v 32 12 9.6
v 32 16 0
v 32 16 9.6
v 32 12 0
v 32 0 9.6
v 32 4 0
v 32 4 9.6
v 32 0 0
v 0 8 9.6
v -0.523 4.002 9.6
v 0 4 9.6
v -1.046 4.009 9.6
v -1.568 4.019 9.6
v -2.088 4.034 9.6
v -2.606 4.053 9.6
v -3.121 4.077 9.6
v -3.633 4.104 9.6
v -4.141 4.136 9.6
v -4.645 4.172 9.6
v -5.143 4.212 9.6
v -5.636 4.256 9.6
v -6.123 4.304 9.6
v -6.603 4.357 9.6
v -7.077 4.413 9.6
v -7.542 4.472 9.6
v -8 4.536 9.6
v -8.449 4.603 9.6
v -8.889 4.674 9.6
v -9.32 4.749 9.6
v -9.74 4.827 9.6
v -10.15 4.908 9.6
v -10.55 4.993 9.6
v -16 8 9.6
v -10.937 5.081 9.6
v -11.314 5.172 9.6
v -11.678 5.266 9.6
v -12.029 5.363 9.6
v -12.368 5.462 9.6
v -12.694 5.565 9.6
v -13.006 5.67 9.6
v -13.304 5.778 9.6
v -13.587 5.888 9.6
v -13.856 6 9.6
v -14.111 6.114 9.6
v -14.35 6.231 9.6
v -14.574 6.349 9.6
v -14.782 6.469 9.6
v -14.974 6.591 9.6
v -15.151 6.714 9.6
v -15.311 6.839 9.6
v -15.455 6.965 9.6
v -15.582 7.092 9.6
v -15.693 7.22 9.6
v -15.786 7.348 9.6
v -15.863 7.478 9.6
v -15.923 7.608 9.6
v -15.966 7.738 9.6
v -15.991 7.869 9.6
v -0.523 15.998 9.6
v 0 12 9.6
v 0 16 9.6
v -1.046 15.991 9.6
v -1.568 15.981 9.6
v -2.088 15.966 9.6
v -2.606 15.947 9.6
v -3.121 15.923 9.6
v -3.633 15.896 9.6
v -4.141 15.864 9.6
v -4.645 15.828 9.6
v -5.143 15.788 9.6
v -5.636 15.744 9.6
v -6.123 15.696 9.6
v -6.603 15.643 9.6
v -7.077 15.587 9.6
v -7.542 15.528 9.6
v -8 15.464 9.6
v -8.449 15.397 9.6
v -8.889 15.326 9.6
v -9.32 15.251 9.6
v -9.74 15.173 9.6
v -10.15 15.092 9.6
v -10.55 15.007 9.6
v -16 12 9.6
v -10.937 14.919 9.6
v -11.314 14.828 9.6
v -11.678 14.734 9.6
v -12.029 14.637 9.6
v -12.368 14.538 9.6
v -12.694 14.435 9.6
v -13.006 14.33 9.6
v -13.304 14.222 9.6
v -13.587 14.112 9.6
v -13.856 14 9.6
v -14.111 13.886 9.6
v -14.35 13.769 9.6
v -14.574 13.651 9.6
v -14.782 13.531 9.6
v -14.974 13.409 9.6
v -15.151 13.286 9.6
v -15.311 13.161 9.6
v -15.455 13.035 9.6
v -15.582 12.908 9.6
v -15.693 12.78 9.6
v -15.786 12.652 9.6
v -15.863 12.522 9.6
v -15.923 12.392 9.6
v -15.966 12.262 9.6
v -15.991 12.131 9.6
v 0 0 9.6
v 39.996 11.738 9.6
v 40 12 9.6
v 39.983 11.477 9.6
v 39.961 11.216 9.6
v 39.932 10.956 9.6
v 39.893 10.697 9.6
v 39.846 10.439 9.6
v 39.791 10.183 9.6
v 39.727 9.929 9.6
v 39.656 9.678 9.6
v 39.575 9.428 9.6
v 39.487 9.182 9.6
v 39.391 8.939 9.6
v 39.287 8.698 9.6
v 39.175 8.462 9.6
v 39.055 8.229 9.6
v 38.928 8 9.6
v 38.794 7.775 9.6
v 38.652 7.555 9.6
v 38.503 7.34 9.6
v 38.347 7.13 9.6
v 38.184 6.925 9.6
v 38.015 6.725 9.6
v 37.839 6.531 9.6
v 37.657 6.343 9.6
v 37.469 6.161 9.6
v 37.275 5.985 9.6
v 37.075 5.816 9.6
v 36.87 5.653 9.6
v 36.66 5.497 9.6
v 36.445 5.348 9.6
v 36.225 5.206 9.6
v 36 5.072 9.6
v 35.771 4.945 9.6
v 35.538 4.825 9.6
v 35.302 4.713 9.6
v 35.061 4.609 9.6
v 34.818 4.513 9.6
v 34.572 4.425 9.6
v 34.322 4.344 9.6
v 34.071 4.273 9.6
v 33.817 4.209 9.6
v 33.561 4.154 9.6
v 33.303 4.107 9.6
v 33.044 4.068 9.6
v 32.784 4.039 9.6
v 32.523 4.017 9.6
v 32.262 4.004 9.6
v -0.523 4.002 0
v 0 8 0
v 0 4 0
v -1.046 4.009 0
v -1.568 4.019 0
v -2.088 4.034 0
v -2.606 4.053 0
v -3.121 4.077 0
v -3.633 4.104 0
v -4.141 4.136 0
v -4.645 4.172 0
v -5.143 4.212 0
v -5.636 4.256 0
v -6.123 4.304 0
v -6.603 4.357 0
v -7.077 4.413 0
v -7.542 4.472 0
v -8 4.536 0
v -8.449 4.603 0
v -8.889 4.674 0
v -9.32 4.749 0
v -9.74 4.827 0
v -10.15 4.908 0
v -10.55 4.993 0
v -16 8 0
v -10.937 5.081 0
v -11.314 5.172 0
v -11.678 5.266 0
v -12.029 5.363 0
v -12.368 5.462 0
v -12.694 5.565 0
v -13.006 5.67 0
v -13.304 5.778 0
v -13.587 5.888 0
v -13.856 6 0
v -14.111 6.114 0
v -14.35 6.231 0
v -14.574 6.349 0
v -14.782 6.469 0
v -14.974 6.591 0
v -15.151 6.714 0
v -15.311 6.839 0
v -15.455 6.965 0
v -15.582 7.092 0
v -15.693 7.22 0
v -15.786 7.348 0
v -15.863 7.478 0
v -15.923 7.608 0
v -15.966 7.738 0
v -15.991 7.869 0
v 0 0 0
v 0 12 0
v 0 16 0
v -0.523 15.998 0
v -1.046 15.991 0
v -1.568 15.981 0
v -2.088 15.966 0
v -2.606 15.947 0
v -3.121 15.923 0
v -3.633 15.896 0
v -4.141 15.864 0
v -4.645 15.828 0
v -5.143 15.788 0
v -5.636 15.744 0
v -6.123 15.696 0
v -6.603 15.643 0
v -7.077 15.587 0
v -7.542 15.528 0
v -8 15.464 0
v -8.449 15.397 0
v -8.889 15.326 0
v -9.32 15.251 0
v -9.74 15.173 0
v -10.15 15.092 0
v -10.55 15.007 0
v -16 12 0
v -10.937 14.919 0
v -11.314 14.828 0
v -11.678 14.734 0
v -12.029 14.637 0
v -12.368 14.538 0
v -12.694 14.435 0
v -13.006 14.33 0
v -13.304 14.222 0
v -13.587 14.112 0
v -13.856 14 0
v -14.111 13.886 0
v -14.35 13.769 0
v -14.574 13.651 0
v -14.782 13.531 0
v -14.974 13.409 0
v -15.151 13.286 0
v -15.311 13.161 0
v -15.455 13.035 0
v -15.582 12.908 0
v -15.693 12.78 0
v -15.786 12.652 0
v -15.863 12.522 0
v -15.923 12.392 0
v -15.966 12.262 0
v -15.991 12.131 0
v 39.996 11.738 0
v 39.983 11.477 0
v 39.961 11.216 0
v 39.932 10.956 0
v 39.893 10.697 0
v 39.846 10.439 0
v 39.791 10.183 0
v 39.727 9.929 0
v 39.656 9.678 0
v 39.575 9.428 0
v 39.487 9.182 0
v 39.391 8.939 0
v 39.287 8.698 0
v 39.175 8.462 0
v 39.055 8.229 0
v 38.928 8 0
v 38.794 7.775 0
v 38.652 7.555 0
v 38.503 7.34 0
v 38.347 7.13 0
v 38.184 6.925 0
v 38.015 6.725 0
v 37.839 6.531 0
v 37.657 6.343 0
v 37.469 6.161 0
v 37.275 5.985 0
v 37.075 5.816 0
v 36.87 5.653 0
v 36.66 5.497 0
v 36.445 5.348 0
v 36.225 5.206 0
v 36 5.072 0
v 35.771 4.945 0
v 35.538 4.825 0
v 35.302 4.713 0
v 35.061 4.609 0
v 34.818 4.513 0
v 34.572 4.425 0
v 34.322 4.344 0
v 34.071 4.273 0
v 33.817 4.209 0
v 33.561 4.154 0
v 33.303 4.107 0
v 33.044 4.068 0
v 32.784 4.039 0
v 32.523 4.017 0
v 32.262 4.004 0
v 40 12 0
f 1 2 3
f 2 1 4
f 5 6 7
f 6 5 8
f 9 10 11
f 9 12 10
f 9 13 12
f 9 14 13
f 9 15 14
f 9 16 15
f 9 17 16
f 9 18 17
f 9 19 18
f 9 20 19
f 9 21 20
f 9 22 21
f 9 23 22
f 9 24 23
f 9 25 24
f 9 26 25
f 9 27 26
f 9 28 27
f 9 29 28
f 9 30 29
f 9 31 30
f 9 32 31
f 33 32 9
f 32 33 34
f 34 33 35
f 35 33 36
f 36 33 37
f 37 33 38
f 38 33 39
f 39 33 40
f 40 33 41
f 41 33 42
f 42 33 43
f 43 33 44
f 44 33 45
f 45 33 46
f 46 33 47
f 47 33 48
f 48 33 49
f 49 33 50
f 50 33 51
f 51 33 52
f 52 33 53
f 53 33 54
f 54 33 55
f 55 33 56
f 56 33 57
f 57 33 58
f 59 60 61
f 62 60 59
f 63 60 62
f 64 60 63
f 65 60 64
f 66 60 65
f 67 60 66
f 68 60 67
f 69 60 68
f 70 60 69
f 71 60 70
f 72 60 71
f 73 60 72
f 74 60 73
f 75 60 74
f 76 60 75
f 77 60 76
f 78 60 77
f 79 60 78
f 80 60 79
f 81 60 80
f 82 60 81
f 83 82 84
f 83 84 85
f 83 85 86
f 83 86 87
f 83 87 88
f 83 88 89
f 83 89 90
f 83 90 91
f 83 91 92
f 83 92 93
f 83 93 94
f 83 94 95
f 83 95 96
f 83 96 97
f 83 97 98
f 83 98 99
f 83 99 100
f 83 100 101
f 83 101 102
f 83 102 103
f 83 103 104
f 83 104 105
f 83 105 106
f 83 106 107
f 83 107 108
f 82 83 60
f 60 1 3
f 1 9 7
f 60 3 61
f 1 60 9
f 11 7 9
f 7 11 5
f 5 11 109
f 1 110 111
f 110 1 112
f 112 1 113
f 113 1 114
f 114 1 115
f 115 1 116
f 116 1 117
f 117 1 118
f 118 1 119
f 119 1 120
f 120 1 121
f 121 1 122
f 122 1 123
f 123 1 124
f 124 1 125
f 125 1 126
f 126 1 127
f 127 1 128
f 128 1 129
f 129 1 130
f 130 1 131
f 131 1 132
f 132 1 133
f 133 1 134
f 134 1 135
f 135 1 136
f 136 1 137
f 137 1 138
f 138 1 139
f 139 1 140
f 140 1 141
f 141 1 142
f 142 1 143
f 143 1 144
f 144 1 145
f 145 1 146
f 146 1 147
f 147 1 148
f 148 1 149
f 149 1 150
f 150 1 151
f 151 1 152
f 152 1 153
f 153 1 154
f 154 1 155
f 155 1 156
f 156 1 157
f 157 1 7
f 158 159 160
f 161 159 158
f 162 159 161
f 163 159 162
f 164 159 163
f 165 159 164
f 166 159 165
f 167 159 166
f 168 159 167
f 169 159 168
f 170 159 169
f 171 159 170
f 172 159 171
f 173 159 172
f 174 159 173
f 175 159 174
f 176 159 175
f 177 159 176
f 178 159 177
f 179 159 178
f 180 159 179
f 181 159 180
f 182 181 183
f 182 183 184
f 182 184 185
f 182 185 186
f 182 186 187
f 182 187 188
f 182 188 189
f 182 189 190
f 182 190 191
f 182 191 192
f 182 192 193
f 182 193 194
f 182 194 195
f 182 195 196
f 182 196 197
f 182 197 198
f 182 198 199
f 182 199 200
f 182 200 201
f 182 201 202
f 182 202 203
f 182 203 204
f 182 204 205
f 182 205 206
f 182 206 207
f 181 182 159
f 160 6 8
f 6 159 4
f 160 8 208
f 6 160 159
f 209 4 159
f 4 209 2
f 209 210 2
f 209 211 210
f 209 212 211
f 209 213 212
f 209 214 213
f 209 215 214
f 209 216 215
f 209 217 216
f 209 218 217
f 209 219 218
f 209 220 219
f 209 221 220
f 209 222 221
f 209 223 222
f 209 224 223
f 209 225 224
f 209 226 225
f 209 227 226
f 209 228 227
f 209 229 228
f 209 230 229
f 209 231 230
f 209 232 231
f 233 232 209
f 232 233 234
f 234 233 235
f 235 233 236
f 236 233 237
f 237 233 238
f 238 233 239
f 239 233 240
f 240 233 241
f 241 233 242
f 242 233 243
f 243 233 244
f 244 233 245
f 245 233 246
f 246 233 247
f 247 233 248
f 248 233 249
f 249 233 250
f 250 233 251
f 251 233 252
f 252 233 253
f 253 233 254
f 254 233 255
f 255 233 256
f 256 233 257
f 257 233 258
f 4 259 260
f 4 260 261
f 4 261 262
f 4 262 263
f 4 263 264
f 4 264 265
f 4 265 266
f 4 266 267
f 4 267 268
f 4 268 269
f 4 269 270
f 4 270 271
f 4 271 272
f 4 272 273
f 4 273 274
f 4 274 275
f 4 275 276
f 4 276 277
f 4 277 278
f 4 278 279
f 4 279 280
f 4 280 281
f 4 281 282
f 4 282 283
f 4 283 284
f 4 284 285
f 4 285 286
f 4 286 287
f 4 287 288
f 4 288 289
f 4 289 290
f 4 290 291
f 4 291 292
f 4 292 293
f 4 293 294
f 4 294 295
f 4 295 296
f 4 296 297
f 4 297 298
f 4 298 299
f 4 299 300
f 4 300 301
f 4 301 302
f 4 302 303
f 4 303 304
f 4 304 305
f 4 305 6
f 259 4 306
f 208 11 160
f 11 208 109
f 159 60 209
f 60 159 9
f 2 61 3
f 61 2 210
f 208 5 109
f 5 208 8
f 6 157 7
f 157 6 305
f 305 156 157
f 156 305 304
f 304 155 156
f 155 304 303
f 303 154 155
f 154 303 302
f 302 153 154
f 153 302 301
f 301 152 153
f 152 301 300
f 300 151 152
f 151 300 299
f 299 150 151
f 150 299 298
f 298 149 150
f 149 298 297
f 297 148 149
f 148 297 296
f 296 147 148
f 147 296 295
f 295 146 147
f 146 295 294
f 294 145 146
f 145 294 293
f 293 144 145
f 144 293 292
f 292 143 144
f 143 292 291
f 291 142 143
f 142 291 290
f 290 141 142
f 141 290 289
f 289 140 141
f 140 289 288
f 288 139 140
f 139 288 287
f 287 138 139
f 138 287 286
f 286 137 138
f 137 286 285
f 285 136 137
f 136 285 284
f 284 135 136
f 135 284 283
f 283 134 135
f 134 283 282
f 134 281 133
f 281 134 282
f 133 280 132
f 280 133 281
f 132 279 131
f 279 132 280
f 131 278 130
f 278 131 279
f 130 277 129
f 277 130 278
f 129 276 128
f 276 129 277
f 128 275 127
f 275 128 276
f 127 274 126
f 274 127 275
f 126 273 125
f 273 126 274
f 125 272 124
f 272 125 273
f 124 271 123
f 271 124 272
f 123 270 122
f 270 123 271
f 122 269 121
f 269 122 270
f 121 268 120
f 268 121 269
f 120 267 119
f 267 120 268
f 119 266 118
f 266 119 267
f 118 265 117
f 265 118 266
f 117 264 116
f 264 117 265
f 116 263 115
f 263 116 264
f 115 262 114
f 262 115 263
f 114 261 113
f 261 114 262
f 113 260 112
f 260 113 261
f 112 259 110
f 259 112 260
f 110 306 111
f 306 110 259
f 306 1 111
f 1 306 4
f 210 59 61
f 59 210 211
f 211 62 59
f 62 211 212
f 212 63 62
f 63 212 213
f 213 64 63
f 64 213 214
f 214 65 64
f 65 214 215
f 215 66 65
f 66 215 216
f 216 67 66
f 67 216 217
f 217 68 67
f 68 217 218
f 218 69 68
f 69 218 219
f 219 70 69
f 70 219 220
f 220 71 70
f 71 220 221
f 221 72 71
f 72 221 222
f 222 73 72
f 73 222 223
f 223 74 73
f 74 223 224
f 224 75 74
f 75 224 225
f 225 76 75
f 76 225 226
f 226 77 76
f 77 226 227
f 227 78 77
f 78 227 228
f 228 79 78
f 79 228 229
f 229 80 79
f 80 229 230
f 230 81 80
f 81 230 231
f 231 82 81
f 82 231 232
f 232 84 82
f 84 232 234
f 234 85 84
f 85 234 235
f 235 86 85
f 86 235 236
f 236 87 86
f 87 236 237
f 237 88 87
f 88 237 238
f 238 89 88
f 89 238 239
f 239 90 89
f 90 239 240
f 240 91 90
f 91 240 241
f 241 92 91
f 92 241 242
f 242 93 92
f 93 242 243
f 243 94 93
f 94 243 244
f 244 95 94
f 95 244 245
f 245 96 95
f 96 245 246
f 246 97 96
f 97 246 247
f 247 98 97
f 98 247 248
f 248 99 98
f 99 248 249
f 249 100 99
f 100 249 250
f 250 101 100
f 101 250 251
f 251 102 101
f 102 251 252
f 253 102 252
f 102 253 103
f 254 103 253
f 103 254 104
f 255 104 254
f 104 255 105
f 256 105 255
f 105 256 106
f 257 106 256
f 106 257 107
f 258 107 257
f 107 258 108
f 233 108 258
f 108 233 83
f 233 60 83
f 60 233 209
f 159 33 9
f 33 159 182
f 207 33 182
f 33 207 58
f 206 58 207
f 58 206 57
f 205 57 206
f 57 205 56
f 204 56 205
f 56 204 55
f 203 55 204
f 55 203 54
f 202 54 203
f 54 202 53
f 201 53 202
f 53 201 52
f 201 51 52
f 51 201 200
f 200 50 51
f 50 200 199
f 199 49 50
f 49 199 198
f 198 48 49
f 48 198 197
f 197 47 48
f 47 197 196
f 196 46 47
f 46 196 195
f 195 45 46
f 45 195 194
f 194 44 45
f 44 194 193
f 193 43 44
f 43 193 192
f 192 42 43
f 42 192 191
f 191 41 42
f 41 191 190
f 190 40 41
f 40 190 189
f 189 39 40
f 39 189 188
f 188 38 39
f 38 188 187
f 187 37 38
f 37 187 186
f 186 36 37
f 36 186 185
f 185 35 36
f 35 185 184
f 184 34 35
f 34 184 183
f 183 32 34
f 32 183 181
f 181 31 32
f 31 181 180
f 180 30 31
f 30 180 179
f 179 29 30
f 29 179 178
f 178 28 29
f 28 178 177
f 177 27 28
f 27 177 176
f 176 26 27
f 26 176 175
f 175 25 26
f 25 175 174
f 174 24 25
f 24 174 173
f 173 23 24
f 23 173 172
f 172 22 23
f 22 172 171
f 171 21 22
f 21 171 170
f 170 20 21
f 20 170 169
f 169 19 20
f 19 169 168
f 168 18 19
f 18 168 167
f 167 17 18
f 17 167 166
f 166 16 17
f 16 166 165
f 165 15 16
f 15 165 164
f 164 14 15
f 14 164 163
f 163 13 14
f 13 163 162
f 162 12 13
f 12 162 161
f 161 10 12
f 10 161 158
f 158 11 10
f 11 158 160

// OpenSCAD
// file: ../core/quality.scad
// ============================================================================
// MachineBlocks Quality System
// Works with `use <...>` because all exported values are functions.
// ============================================================================

// ----------------------------------------------------------------------------
// Quality classes

function mb_q_functional() = 0; // fit-critical
function mb_q_visual()     = 1; // visible
function mb_q_hidden()     = 2; // internal / invisible

function mb_q_class_from_string(quality) =
    is_num(quality) ? mb_q_clamp(quality, mb_q_functional(), mb_q_hidden()) :
    quality == "functional" ? mb_q_functional() :
    quality == "visual"     ? mb_q_visual()     :
    quality == "hidden"     ? mb_q_hidden()     :
                              mb_q_visual();

// ----------------------------------------------------------------------------
// User quality presets

function mb_q_preview() = 0;
function mb_q_normal()  = 1;
function mb_q_print()   = 2;
function mb_q_render()  = 3;

function mb_q_preset_from_string(quality) =
    is_num(quality) ? mb_q_clamp(quality, mb_q_preview(), mb_q_render()) :
    quality == "preview" ? mb_q_preview() :
    quality == "normal"  ? mb_q_normal()  :
    quality == "print"   ? mb_q_print()   :
    quality == "render"  ? mb_q_render()  :
                           mb_q_normal();

// ----------------------------------------------------------------------------
// Default mappings
//
// Profile row: [segment_length_mm, fn_max]
// Smaller segment length = higher quality.

function mb_q_default_profile() =
[
    [0.55, 32],    // preview
    [0.38, 48],    // normal
    [0.28, 64],    // print
    [0.16, 120]    // render
];

function mb_q_default_class_factors() =
[
    1.00,          // functional
    1.35,          // visual
    2.25           // hidden
];

function mb_q_default_class_min_segments() =
[
    16,            // functional
    12,            // visual
    8              // hidden
];

// ----------------------------------------------------------------------------
// Helpers

function mb_q_clamp(x, a, b) =
    max(a, min(b, x));

function mb_q_make_even(n) =
    (n % 2 == 0) ? n : (n + 1);

function mb_q_max_radius(r) =
    is_list(r)
        ? (
            len(r) == 0
                ? 0
                : max([for (e = r) mb_q_max_radius(e)])
        )
        : r;

// ----------------------------------------------------------------------------
// Preview multiplier
//
// preview_quality:
//   1 = no preview reduction
//   0 = strongest preview reduction
//
// preview_max_mult is applied to segment length, not directly to fn.

function mb_q_preview_mult(preview_quality, preview_max_mult) =
    let(p = mb_q_clamp(preview_quality, 0, 1))
    1 + (1 - p) * (preview_max_mult - 1);

// ----------------------------------------------------------------------------
// Full-circle fn resolver
//
// Contract:
//   returned fn = segment count for a complete 360° circle.
//
// Responsibility:
//   Part/feature chooses class.
//   Shape receives only resolution/fn.

function mb_q_fn_for_radius(
    r,
    q,

    preset = undef,

    profile = undef,
    class_factors = undef,
    class_min_segments = undef,

    segment_multiplier = undef,

    preview_quality = undef,
    preview_max_mult = undef,
    is_preview = $preview
) =
    let(
        qq = mb_q_class_from_string(q),

        pp = mb_q_preset_from_string(preset),

        prof = is_undef(profile)
            ? mb_q_default_profile()
            : profile,

        factors = is_undef(class_factors)
            ? mb_q_default_class_factors()
            : class_factors,

        min_fn = is_undef(class_min_segments)
            ? mb_q_default_class_min_segments()
            : class_min_segments,

        rr = max(0.01, mb_q_max_radius(r)),

        seg_base = prof[pp][0],
        fn_max   = prof[pp][1],

        pm = is_preview
            ? mb_q_preview_mult(
                is_undef(preview_quality) ? 1.0 : preview_quality, 
                is_undef(preview_max_mult) ? 2.5 : preview_max_mult
            )
            : 1.0,

        // Bigger segment length => fewer full-circle segments.
        seg = seg_base * factors[qq] * (is_undef(segment_multiplier) ? 1.0 : segment_multiplier) * pm,

        fn_raw = (2 * PI * rr) / seg,
        fn_rounded = ceil(fn_raw)
    )
    mb_q_clamp(fn_rounded, min_fn[qq], fn_max);

// ----------------------------------------------------------------------------
// Even full-circle fn resolver
//
// Use for cylinders, tubes, studs, holes, and symmetric round geometry.

function mb_q_fn_even_for_radius(
    r,
    q,

    preset = undef,

    profile = undef,
    class_factors = undef,
    class_min_segments = undef,

    segment_multiplier = undef,

    preview_quality = undef,
    preview_max_mult = undef,
    is_preview = $preview
) =
    mb_q_make_even(
        mb_q_fn_for_radius(
            r = r,
            q = q,
            preset = preset,
            profile = profile,
            class_factors = class_factors,
            class_min_segments = class_min_segments,
            segment_multiplier = segment_multiplier,
            preview_quality = preview_quality,
            preview_max_mult = preview_max_mult,
            is_preview = is_preview
        )
    );

// ----------------------------------------------------------------------------
// Partial arc helpers
//
// Preserve the full-circle contract:
//
//   360° -> fn
//   180° -> fn / 2
//    90° -> fn / 4

function mb_q_fn_for_angle(fn, angle, min_n = 3) =
    max(min_n, ceil(fn * abs(angle) / 360));

function mb_q_fn_for_quarter(fn, min_n = 4) =
    mb_q_fn_for_angle(fn, 90, min_n);

function mb_q_fn_for_half(fn, min_n = 6) =
    mb_q_fn_for_angle(fn, 180, min_n);

// ============================================================================
// Usage examples
// ============================================================================

// Stud: functional
module example_q_stud(radius = 2.4, quality = undef) {
    fn = mb_q_fn_even_for_radius(
        r = radius,
        q = mb_q_functional(),
        preset = quality
    );

    cylinder(r = radius, h = 1.8, $fn = fn);
}

// Brick corner: visual
module example_q_brick_corner(radius = 1.0, quality = undef) {
    fn = mb_q_fn_for_radius(
        r = radius,
        q = mb_q_visual(),
        preset = quality
    );

    // mb_corner(radius = radius, resolution = fn);
}

// Groove: hidden
module example_q_groove(radius = 0.3, quality = undef) {
    fn = mb_q_fn_for_radius(
        r = radius,
        q = mb_q_hidden(),
        preset = quality
    );

    // mb_corner(radius = radius, resolution = fn);
}

// Shape-level quarter arc
module example_q_shape_corner(radius = 1.0, resolution = 64) {
    n_a = mb_q_fn_for_quarter(resolution);

    echo(full_circle_resolution = resolution);
    echo(quarter_arc_segments = n_a);
}

function mb_q_fn_for_size(
    size,
    q,
    preset = undef,
    profile = undef,
    class_factors = undef,
    class_min_segments = undef,
    segment_multiplier = undef,
    preview_quality = undef,
    preview_max_mult = undef,
    is_preview = $preview
) =
    mb_q_fn_for_radius(
        r = max(0.5, size / 2),
        q = q,
        preset = preset,
        profile = profile,
        class_factors = class_factors,
        class_min_segments = class_min_segments,
        segment_multiplier = segment_multiplier,
        preview_quality = preview_quality,
        preview_max_mult = preview_max_mult,
        is_preview = is_preview
    );
// main file
use <../core/utils.scad>;
use <../core/quality.scad>;

function _mb_tube_arc_points(cx, cy, rx, ry, a0, a1, segments = 8) =
    [
        for (i = [0:segments])
            let(a = a0 + (a1 - a0) * i / segments)
                [cx + cos(a) * rx, cy + sin(a) * ry]
    ];

function _mb_tube_rr_xy(rr) =
    is_list(rr) ? [max(0, rr[0]), max(0, len(rr) > 1 ? rr[1] : rr[0])]
                : let(r = max(0, is_num(rr) ? rr : 0)) [r, r];

function _mb_tube_scale_rr(rr, mul_r, mul_l) =
    is_list(rr) ? [rr[0] * mul_r, (len(rr) > 1 ? rr[1] : rr[0]) * mul_l]
                : is_num(rr) ? rr * mul_r : 0;

function _mb_tube_rr_max_component(rr) =
    let(xy = _mb_tube_rr_xy(rr))
        max(xy[0], xy[1]);

function _mb_tube_profile_points(
    radius_inner,
    radius_outer,

    start,
    end,

    start_rounding_radius,
    end_rounding_radius,

    clamp_inner_start_thickness,
    clamp_inner_start_height,
    clamp_inner_start_offset,
    clamp_inner_start_rounding_radius,
    
    clamp_inner_end_thickness,
    clamp_inner_end_height,
    clamp_inner_end_offset,
    clamp_inner_end_rounding_radius,

    clamp_outer_start_thickness,
    clamp_outer_start_height,
    clamp_outer_start_offset,
    clamp_outer_start_rounding_radius,
    
    clamp_outer_end_thickness,
    clamp_outer_end_height,
    clamp_outer_end_offset,
    clamp_outer_end_rounding_radius,

    rounding_resolution_edge
) =
    let(
        // radius_inner may be negative (e.g. mb_rail / linear_extrude).
        // mb_tube clamps to >= 0 before calling (rotate_extrude requires x >= 0).
        radius_outer = max(radius_inner, radius_outer),
        ring_thickness = radius_outer - radius_inner,
        max_rr = radius_inner == 0 ? radius_outer : 0.5 * ring_thickness,
        end = max(start, end),
        length = end - start,
        has_inner = radius_inner != 0,

        // Clamp Outer Start
        cbos_offset = min(length, max(0, clamp_outer_start_offset)),
        cbos_height = min(length - cbos_offset, max(0, clamp_outer_start_height)),
        cbos_thickness = clamp_outer_start_thickness < 0 ? sign(clamp_outer_start_thickness) * min(ring_thickness, abs(clamp_outer_start_thickness)) : clamp_outer_start_thickness,
        cbos = cbos_height > 0 && cbos_thickness != 0,
        cbos_rr_raw = _mb_tube_rr_xy(clamp_outer_start_rounding_radius),
        cbos_rx = min(cbos_rr_raw[0], abs(cbos_thickness)),
        cbos_ry = min(cbos_rr_raw[1], cbos_height),
        cbos_round = cbos_rx > 0 && cbos_ry > 0,
        cbos_outer_radius = radius_outer + cbos_thickness,
        cbos_y_start = start + cbos_offset,
        cbos_y_end = cbos_y_start + cbos_height,
        cbos_x_rounding = cbos_outer_radius - sign(clamp_outer_start_thickness) * cbos_rx,
        cbos_y_rounding = cbos_y_start + cbos_ry,

        // Clamp Outer End
        cboe_offset = min(length - cbos_offset - cbos_height, max(0, clamp_outer_end_offset)),
        cboe_height = min(length - cbos_offset - cbos_height - cboe_offset, max(0, clamp_outer_end_height)),
        cboe_thickness = clamp_outer_end_thickness < 0 ? sign(clamp_outer_end_thickness) * min(ring_thickness, abs(clamp_outer_end_thickness)) : clamp_outer_end_thickness,
        cboe = cboe_height > 0 && cboe_thickness != 0,
        cboe_rr_raw = _mb_tube_rr_xy(clamp_outer_end_rounding_radius),
        cboe_rx = min(cboe_rr_raw[0], abs(cboe_thickness)),
        cboe_ry = min(cboe_rr_raw[1], cboe_height),
        cboe_round = cboe_rx > 0 && cboe_ry > 0,
        cboe_outer_radius = radius_outer + cboe_thickness,
        cboe_y_end = end - cboe_offset,
        cboe_y_start = cboe_y_end - cboe_height,
        cboe_x_rounding = cboe_outer_radius - sign(clamp_outer_end_thickness) * cboe_rx,
        cboe_y_rounding = cboe_y_end - cboe_ry,

        // Clamp Inner Start
        cbis_offset = min(length, max(0, clamp_inner_start_offset)),
        cbis_height = min(length - cbis_offset, max(0, clamp_inner_start_height)),
        cbis_thickness = clamp_inner_start_thickness < 0
            ? sign(clamp_inner_start_thickness) * min(ring_thickness, abs(clamp_inner_start_thickness))
            : radius_inner > 0
                ? min(radius_inner, clamp_inner_start_thickness)
                : clamp_inner_start_thickness,
        cbis = has_inner && cbis_height > 0 && cbis_thickness != 0,
        cbis_rr_raw = _mb_tube_rr_xy(clamp_inner_start_rounding_radius),
        cbis_rx = min(cbis_rr_raw[0], abs(cbis_thickness)),
        cbis_ry = min(cbis_rr_raw[1], cbis_height),
        cbis_round = cbis_rx > 0 && cbis_ry > 0,
        cbis_inner_radius = radius_inner - cbis_thickness,
        cbis_y_start = start + cbis_offset,
        cbis_y_end = cbis_y_start + cbis_height,
        cbis_x_rounding = cbis_inner_radius + sign(cbis_thickness) * cbis_rx,
        cbis_y_rounding = cbis_y_start + cbis_ry,

        // Clamp Inner End
        cbie_offset = min(length - cbis_offset - cbis_height, max(0, clamp_inner_end_offset)),
        cbie_height = min(length - cbis_offset - cbis_height - cbie_offset, max(0, clamp_inner_end_height)),
        cbie_thickness = clamp_inner_end_thickness < 0
            ? sign(clamp_inner_end_thickness) * min(ring_thickness, abs(clamp_inner_end_thickness))
            : radius_inner > 0
                ? min(radius_inner, clamp_inner_end_thickness)
                : clamp_inner_end_thickness,
        cbie = has_inner && cbie_height > 0 && cbie_thickness != 0,
        cbie_rr_raw = _mb_tube_rr_xy(clamp_inner_end_rounding_radius),
        cbie_rx = min(cbie_rr_raw[0], abs(cbie_thickness)),
        cbie_ry = min(cbie_rr_raw[1], cbie_height),
        cbie_round = cbie_rx > 0 && cbie_ry > 0,
        cbie_inner_radius = radius_inner - cbie_thickness,
        cbie_y_end = end - cbie_offset,
        cbie_y_start = cbie_y_end - cbie_height,
        cbie_x_rounding = cbie_inner_radius + sign(cbie_thickness) * cbie_rx,
        cbie_y_rounding = cbie_y_end - cbie_ry,

        // Start
        si_rr = min(max(0, start_rounding_radius), max_rr, cbis ? cbis_offset : cbie ? (length - cbie_offset - cbie_height) : length),
        so_rr = min(max(0, start_rounding_radius), max_rr, cbos ? cbos_offset : cboe ? (length - cboe_offset - cboe_height) : length),
        si_x_rounding = radius_inner + si_rr,
        so_x_rounding = radius_outer - so_rr,
        si_y_rounding = start + si_rr,
        so_y_rounding = start + so_rr,

        // End
        ei_rr = min(max(0, end_rounding_radius), max_rr, cbie ? cbie_offset : cbis ? (length - cbis_offset - cbis_height) : length),
        eo_rr = min(max(0, end_rounding_radius), max_rr, cboe ? cboe_offset : cbos ? (length - cbos_offset - cbos_height) : length),
        ei_x_rounding = radius_inner + ei_rr,
        eo_x_rounding = radius_outer - eo_rr,
        ei_y_rounding = end - ei_rr,
        eo_y_rounding = end - eo_rr
    )
    concat(
        // Start Inner
        cbis && cbis_offset == 0 ? [] : concat(
            si_rr > 0 && has_inner ? concat(
                [
                    [radius_inner, si_y_rounding]
                ],
                _mb_tube_arc_points(
                    cx = si_x_rounding,
                    cy = si_y_rounding,
                    rx = si_rr,
                    ry = si_rr,
                    a0 = -90,
                    a1 = -180,
                    segments = rounding_resolution_edge
                )
            ) : [],
            [
                [si_rr > 0 && has_inner ? si_x_rounding : radius_inner, start]
            ]
        ),

        // Start Outer
        cbos && cbos_offset == 0 ? [] : concat(
            [
                [so_rr > 0 ? so_x_rounding : radius_outer, start],
            ],
            so_rr > 0 ? concat(
                _mb_tube_arc_points(
                    cx = so_x_rounding,
                    cy = so_y_rounding,
                    rx = so_rr,
                    ry = so_rr,
                    a0 = -90,
                    a1 = 0,
                    segments = rounding_resolution_edge
                ),
                [
                    [radius_outer, so_y_rounding]
                ]
            ) : []
        ),

        // Clamp Outer Start
        cbos ? concat(
            cbos_offset == 0 ? [] : [
                [radius_outer, cbos_y_start]
            ],
            [
                [cbos_round ? cbos_x_rounding : cbos_outer_radius, cbos_y_start],
            ],
            cbos_round ? _mb_tube_arc_points(
                cx = cbos_x_rounding,
                cy = cbos_y_rounding,
                rx = cbos_rx,
                ry = cbos_ry,
                a0 = -90,
                a1 = cbos_thickness < 0 ? -180 : 0,
                segments = rounding_resolution_edge
            ) : [],
            [
                [cbos_outer_radius, cbos_y_end],
                [radius_outer, cbos_y_end]
            ]
        ) : [],

        // Clamp Outer End
        cboe ? concat(
            [
                [radius_outer, cboe_y_start],
                [cboe_outer_radius, cboe_y_start],
                [cboe_outer_radius, cboe_round ? cboe_y_rounding : cboe_y_end]
            ],
            cboe_round ? _mb_tube_arc_points(
                cx = cboe_x_rounding,
                cy = cboe_y_rounding,
                rx = cboe_rx,
                ry = cboe_ry,
                a0 = cboe_thickness < 0 ? 180 : 0,
                a1 = 90,
                segments = rounding_resolution_edge
            ) : [],
            cboe_offset == 0 ? [] : [
                [radius_outer, cboe_y_end]
            ]
        ) : [],

        // End Outer
        cboe && cboe_offset == 0 ? [] : concat(
            eo_rr > 0 ? concat(
                [
                    [radius_outer, eo_y_rounding],
                ],
                _mb_tube_arc_points(
                    cx = eo_x_rounding,
                    cy = eo_y_rounding,
                    rx = eo_rr,
                    ry = eo_rr,
                    a0 = 0,
                    a1 = 90,
                    segments = rounding_resolution_edge
                )
            ) : [],
            [
                [eo_rr > 0 ? eo_x_rounding : radius_outer, end]
            ]
        ),

        // End Inner
        cbie && cbie_offset == 0 ? [] : concat(
            ei_rr > 0 && has_inner ? concat(
                [
                    [ei_x_rounding, end]
                ],
                _mb_tube_arc_points(
                    cx = ei_x_rounding,
                    cy = ei_y_rounding,
                    rx = ei_rr,
                    ry = ei_rr,
                    a0 = 180,
                    a1 = 90,
                    segments = rounding_resolution_edge
                )
            ) : [],
            [
                [radius_inner, ei_rr > 0 && has_inner ? ei_y_rounding : end]
            ]
        ),

        // Clamp Inner End (walk end→start; structure like Clamp Outer Start)
        cbie ? concat(
            cbie_offset == 0 ? [] : [
                [radius_inner, cbie_y_end]
            ],
            [
                [cbie_round ? cbie_x_rounding : cbie_inner_radius, cbie_y_end],
            ],
            cbie_round ? _mb_tube_arc_points(
                cx = cbie_x_rounding,
                cy = cbie_y_rounding,
                rx = cbie_rx,
                ry = cbie_ry,
                a0 = 90,
                a1 = cbie_thickness < 0 ? 0 : 180,
                segments = rounding_resolution_edge
            ) : [],
            [
                [cbie_inner_radius, cbie_y_start],
                [radius_inner, cbie_y_start]
            ]
        ) : [],

        // Clamp Inner Start (walk end→start; structure like Clamp Outer End)
        cbis ? concat(
            [
                [radius_inner, cbis_y_end],
                [cbis_inner_radius, cbis_y_end],
                [cbis_inner_radius, cbis_round ? cbis_y_rounding : cbis_y_start]
            ],
            cbis_round ? _mb_tube_arc_points(
                cx = cbis_x_rounding,
                cy = cbis_y_rounding,
                rx = cbis_rx,
                ry = cbis_ry,
                a0 = cbis_thickness < 0 ? 0 : 180,
                a1 = cbis_thickness < 0 ? -90 : 270,
                segments = rounding_resolution_edge
            ) : [],
            cbis_offset == 0 ? [] : [
                [radius_inner, cbis_y_start]
            ]
        ) : []
    );

module mb_tube(
    radius,
    length,
    rounding_radius = undef,

    clamp_inner_start = undef,
    clamp_inner_end = undef,
    
    clamp_outer_start = undef,
    clamp_outer_end = undef,

    axis = "z",
    offset = undef,
    mul = undef,
    
    quality_class_tube = "functional",
    quality_class_edge = "visual",

    quality = "normal",

    q_profile = undef,
    q_class_factors = undef,
    q_class_min_segments = undef,
    q_segment_multiplier = undef,
    q_preview_quality = undef,
    q_preview_max_mult = undef,

    color = "white",
    draw_together = false,
    debug = false
) {
    axis = mb_axis_to_int(axis);
    offset = mb_resolve_xyz(offset, default = [0, 0, 0]);
    mul = mb_resolve_xyz(mul, default = [1, 1, 1]);
    mul_radius = mul[0];
    mul_length = mul[axis];

    start = (is_list(length) ? length[0] : is_num(length) ? -0.5 * length : 0) * mul_length; 
    end = (is_list(length) ? length[1] : is_num(length) ? 0.5 * length : 0) * mul_length;

    radius_inner = max(0, (is_list(radius) && len(radius) > 1 ? radius[0] : 0) * mul_radius);
    radius_outer = (is_list(radius) && len(radius) > 0 ? (len(radius) > 1 ? radius[1] : radius[0]) : radius) * mul_radius; 

    start_rounding_radius = (is_list(rounding_radius) ? rounding_radius[0] : is_num(rounding_radius) ? rounding_radius : 0) * mul_radius;
    end_rounding_radius = (is_list(rounding_radius) ? rounding_radius[1] : is_num(rounding_radius) ? rounding_radius : 0) * mul_radius;
    
    if((end - start) > 0 && (radius_outer - radius_inner) > 0){
        rot = mb_axis_rotate(axis);

        clamp_inner_start_thickness = !is_list(clamp_inner_start) || is_undef(clamp_inner_start[0]) ? 0 : clamp_inner_start[0] * mul_radius;
        clamp_inner_start_height = !is_list(clamp_inner_start) || is_undef(clamp_inner_start[1]) ? 0 : clamp_inner_start[1] * mul_length;
        clamp_inner_start_offset = !is_list(clamp_inner_start) || is_undef(clamp_inner_start[2]) ? 0 : clamp_inner_start[2] * mul_length;
        clamp_inner_start_rounding_radius = !is_list(clamp_inner_start) || is_undef(clamp_inner_start[3])
            ? 0
            : _mb_tube_scale_rr(clamp_inner_start[3], mul_radius, mul_length);

        clamp_inner_end_thickness = !is_list(clamp_inner_end) || is_undef(clamp_inner_end[0]) ? 0 : clamp_inner_end[0] * mul_radius;
        clamp_inner_end_height = !is_list(clamp_inner_end) || is_undef(clamp_inner_end[1]) ? 0 : clamp_inner_end[1] * mul_length;
        clamp_inner_end_offset = !is_list(clamp_inner_end) || is_undef(clamp_inner_end[2]) ? 0 : clamp_inner_end[2] * mul_length;
        clamp_inner_end_rounding_radius = !is_list(clamp_inner_end) || is_undef(clamp_inner_end[3])
            ? 0
            : _mb_tube_scale_rr(clamp_inner_end[3], mul_radius, mul_length);

        clamp_outer_start_thickness = !is_list(clamp_outer_start) || is_undef(clamp_outer_start[0]) ? 0 : clamp_outer_start[0] * mul_radius;
        clamp_outer_start_height = !is_list(clamp_outer_start) || is_undef(clamp_outer_start[1]) ? 0 : clamp_outer_start[1] * mul_length;
        clamp_outer_start_offset = !is_list(clamp_outer_start) || is_undef(clamp_outer_start[2]) ? 0 : clamp_outer_start[2] * mul_length;
        clamp_outer_start_rounding_radius = !is_list(clamp_outer_start) || is_undef(clamp_outer_start[3])
            ? 0
            : _mb_tube_scale_rr(clamp_outer_start[3], mul_radius, mul_length);

        clamp_outer_end_thickness = !is_list(clamp_outer_end) || is_undef(clamp_outer_end[0]) ? 0 : clamp_outer_end[0] * mul_radius;
        clamp_outer_end_height = !is_list(clamp_outer_end) || is_undef(clamp_outer_end[1]) ? 0 : clamp_outer_end[1] * mul_length;
        clamp_outer_end_offset = !is_list(clamp_outer_end) || is_undef(clamp_outer_end[2]) ? 0 : clamp_outer_end[2] * mul_length;
        clamp_outer_end_rounding_radius = !is_list(clamp_outer_end) || is_undef(clamp_outer_end[3])
            ? 0
            : _mb_tube_scale_rr(clamp_outer_end[3], mul_radius, mul_length);

        rounding_resolution_tube = mb_q_fn_even_for_radius(
            r = radius_outer,
            q = quality_class_tube,
            preset = quality,
            profile = q_profile,
            class_factors = q_class_factors,
            class_min_segments = q_class_min_segments,
            segment_multiplier = q_segment_multiplier,
            preview_quality = q_preview_quality,
            preview_max_mult = q_preview_max_mult
        );

        rounding_resolution_edge = mb_q_fn_even_for_radius(
            r = max(
                _mb_tube_rr_max_component(clamp_inner_start_rounding_radius),
                _mb_tube_rr_max_component(clamp_inner_end_rounding_radius),
                _mb_tube_rr_max_component(clamp_outer_start_rounding_radius),
                _mb_tube_rr_max_component(clamp_outer_end_rounding_radius)
            ),
            q = quality_class_edge,
            preset = quality,
            profile = q_profile,
            class_factors = q_class_factors,
            class_min_segments = q_class_min_segments,
            segment_multiplier = q_segment_multiplier,
            preview_quality = q_preview_quality,
            preview_max_mult = q_preview_max_mult
        );

        is_cylinder = radius_inner == 0 && 
            start_rounding_radius == 0 && 
            end_rounding_radius == 0 &&
            (clamp_inner_start_thickness == 0 || clamp_inner_start_height == 0) &&
            (clamp_inner_end_thickness == 0 || clamp_inner_end_height == 0) &&
            (clamp_outer_start_thickness == 0 || clamp_outer_start_height == 0) &&
            (clamp_outer_end_thickness == 0 || clamp_outer_end_height == 0);

        translate([offset[0] * mul[0], offset[1] * mul[1], offset[2] * mul[2]])
            rotate(rot){
                if(is_cylinder || draw_together){
                    color(draw_together || debug ? "green" : color)
                        translate([0, 0, 0.5 * (start + end)])
                            cylinder(r = radius_outer, h = (end - start), center = true, $fn = rounding_resolution_tube);
                }

                if(!is_cylinder || draw_together){
                    color(draw_together || debug ? "yellow" : color)
                        rotate_extrude(convexity = 10, $fn = rounding_resolution_tube)
                            polygon(points = _mb_tube_profile_points(
                                radius_inner = radius_inner,
                                radius_outer = radius_outer,
                                
                                start = start, 
                                end = end,
                            
                                start_rounding_radius = start_rounding_radius,
                                end_rounding_radius = end_rounding_radius,

                                clamp_inner_start_thickness = clamp_inner_start_thickness,
                                clamp_inner_start_height = clamp_inner_start_height,
                                clamp_inner_start_offset = clamp_inner_start_offset,
                                clamp_inner_start_rounding_radius = clamp_inner_start_rounding_radius,
                                
                                clamp_inner_end_thickness = clamp_inner_end_thickness,
                                clamp_inner_end_height = clamp_inner_end_height,
                                clamp_inner_end_offset = clamp_inner_end_offset,
                                clamp_inner_end_rounding_radius = clamp_inner_end_rounding_radius,

                                clamp_outer_start_thickness = clamp_outer_start_thickness,
                                clamp_outer_start_height = clamp_outer_start_height,
                                clamp_outer_start_offset = clamp_outer_start_offset,
                                clamp_outer_start_rounding_radius = clamp_outer_start_rounding_radius,
                                
                                clamp_outer_end_thickness = clamp_outer_end_thickness,
                                clamp_outer_end_height = clamp_outer_end_height,
                                clamp_outer_end_offset = clamp_outer_end_offset,
                                clamp_outer_end_rounding_radius = clamp_outer_end_rounding_radius,

                                rounding_resolution_edge = rounding_resolution_edge
                            ));
                }
            }
    }
}   

module mb_rail(
    size, 
    rounding_radius = undef,

    clamp_inner_start = undef,
    clamp_inner_end = undef,
    
    clamp_outer_start = undef,
    clamp_outer_end = undef,

    axis = "z",
    offset = undef,
    mul = undef,
    
    quality_class_tube = "functional",
    quality_class_edge = "visual",

    quality = "normal",

    q_profile = undef,
    q_class_factors = undef,
    q_class_min_segments = undef,
    q_segment_multiplier = undef,
    q_preview_quality = undef,
    q_preview_max_mult = undef,

    color = "white",
    draw_together = false,
    debug = false
) {
    axis = mb_axis_to_int(axis);
    size =  mb_cube_size_resolve(size);
    offset = mb_resolve_xyz(offset, default = [0, 0, 0]);
    mul = mb_resolve_xyz(mul, default = [1, 1, 1]);
    mul_radius = mul[0];
    mul_length = mul[axis];

    dim = [
            size[1][0] - size[0][0], 
            size[1][1] - size[0][1],
            size[1][2] - size[0][2]
        ];

    tr = [
        0.5 * (size[0][0] + size[1][0]),
        0.5 * (size[0][1] + size[1][1]),
        0.5 * (size[0][2] + size[1][2])
    ];

    si = [
        dim[0] * mul[0], 
        dim[1] * mul[1], 
        dim[2] * mul[2]
    ];

    sid = axis == 0 ? 
            [
                si[2],
                si[1],
                si[0]   
            ] : 
            axis == 1 ?
            [
                si[0],
                si[2],
                si[1]    
            ] : 
            
            si;

    start = -0.5 * sid[1]; 
    end = 0.5 * sid[1];

    radius_inner = -0.5 * sid[0];
    radius_outer = 0.5 * sid[0]; 

    start_rounding_radius = (is_list(rounding_radius) ? rounding_radius[0] : is_num(rounding_radius) ? rounding_radius : 0) * mul_radius;
    end_rounding_radius = (is_list(rounding_radius) ? rounding_radius[1] : is_num(rounding_radius) ? rounding_radius : 0) * mul_radius;
    
    if((end - start) > 0 && (radius_outer - radius_inner) > 0){
        rot = mb_axis_rotate(axis);

        clamp_mul_height = axis == 0 ? mul[1] : axis == 1 ? mul[2] : mul[0];
        clamp_mul_thickness = axis == 0 ? mul[2] : axis == 1 ? mul[0] : mul[0];

        clamp_inner_start_thickness = !is_list(clamp_inner_start) || is_undef(clamp_inner_start[0]) ? 0 : clamp_inner_start[0] * clamp_mul_thickness;
        clamp_inner_start_height = !is_list(clamp_inner_start) || is_undef(clamp_inner_start[1]) ? 0 : clamp_inner_start[1] * clamp_mul_height;
        clamp_inner_start_offset = !is_list(clamp_inner_start) || is_undef(clamp_inner_start[2]) ? 0 : clamp_inner_start[2] * clamp_mul_height;
        clamp_inner_start_rounding_radius = !is_list(clamp_inner_start) || is_undef(clamp_inner_start[3])
            ? 0
            : _mb_tube_scale_rr(clamp_inner_start[3], mul_radius, mul_length);

        clamp_inner_end_thickness = !is_list(clamp_inner_end) || is_undef(clamp_inner_end[0]) ? 0 : clamp_inner_end[0] * clamp_mul_thickness;
        clamp_inner_end_height = !is_list(clamp_inner_end) || is_undef(clamp_inner_end[1]) ? 0 : clamp_inner_end[1] * clamp_mul_height;
        clamp_inner_end_offset = !is_list(clamp_inner_end) || is_undef(clamp_inner_end[2]) ? 0 : clamp_inner_end[2] * clamp_mul_height;
        clamp_inner_end_rounding_radius = !is_list(clamp_inner_end) || is_undef(clamp_inner_end[3])
            ? 0
            : _mb_tube_scale_rr(clamp_inner_end[3], mul_radius, mul_length);

        clamp_outer_start_thickness = !is_list(clamp_outer_start) || is_undef(clamp_outer_start[0]) ? 0 : clamp_outer_start[0] * clamp_mul_thickness;
        clamp_outer_start_height = !is_list(clamp_outer_start) || is_undef(clamp_outer_start[1]) ? 0 : clamp_outer_start[1] * clamp_mul_height;
        clamp_outer_start_offset = !is_list(clamp_outer_start) || is_undef(clamp_outer_start[2]) ? 0 : clamp_outer_start[2] * clamp_mul_height;
        clamp_outer_start_rounding_radius = !is_list(clamp_outer_start) || is_undef(clamp_outer_start[3])
            ? 0
            : _mb_tube_scale_rr(clamp_outer_start[3], mul_radius, mul_length);

        clamp_outer_end_thickness = !is_list(clamp_outer_end) || is_undef(clamp_outer_end[0]) ? 0 : clamp_outer_end[0] * clamp_mul_thickness;
        clamp_outer_end_height = !is_list(clamp_outer_end) || is_undef(clamp_outer_end[1]) ? 0 : clamp_outer_end[1] * clamp_mul_height;
        clamp_outer_end_offset = !is_list(clamp_outer_end) || is_undef(clamp_outer_end[2]) ? 0 : clamp_outer_end[2] * clamp_mul_height;
        clamp_outer_end_rounding_radius = !is_list(clamp_outer_end) || is_undef(clamp_outer_end[3])
            ? 0
            : _mb_tube_scale_rr(clamp_outer_end[3], mul_radius, mul_length);

        rounding_resolution_tube = mb_q_fn_even_for_radius(
            r = radius_outer,
            q = quality_class_tube,
            preset = quality,
            profile = q_profile,
            class_factors = q_class_factors,
            class_min_segments = q_class_min_segments,
            segment_multiplier = q_segment_multiplier,
            preview_quality = q_preview_quality,
            preview_max_mult = q_preview_max_mult
        );

        rounding_resolution_edge = mb_q_fn_even_for_radius(
            r = max(
                _mb_tube_rr_max_component(clamp_inner_start_rounding_radius),
                _mb_tube_rr_max_component(clamp_inner_end_rounding_radius),
                _mb_tube_rr_max_component(clamp_outer_start_rounding_radius),
                _mb_tube_rr_max_component(clamp_outer_end_rounding_radius)
            ),
            q = quality_class_edge,
            preset = quality,
            profile = q_profile,
            class_factors = q_class_factors,
            class_min_segments = q_class_min_segments,
            segment_multiplier = q_segment_multiplier,
            preview_quality = q_preview_quality,
            preview_max_mult = q_preview_max_mult
        );

        is_cube = radius_inner == 0 && 
            start_rounding_radius == 0 && 
            end_rounding_radius == 0 &&
            (clamp_inner_start_thickness == 0 || clamp_inner_start_height == 0) &&
            (clamp_inner_end_thickness == 0 || clamp_inner_end_height == 0) &&
            (clamp_outer_start_thickness == 0 || clamp_outer_start_height == 0) &&
            (clamp_outer_end_thickness == 0 || clamp_outer_end_height == 0);

        translate([
            (tr[0] + offset[0]) * mul[0],  // + axis == 2 ? 0.5 * (max(clamp_inner_start_thickness, clamp_inner_end_thickness) + max(clamp_outer_start_thickness, clamp_outer_end_thickness)) : 0
            (tr[1] + offset[1]) * mul[1], 
            (tr[2] + offset[2]) * mul[2]
        ])
            rotate(rot){
                if(is_cube || draw_together){
                    color(draw_together || debug ? "green" : color)
                        cube(size = sid, center = true);
                }

                if(!is_cube || draw_together){
                    color(draw_together || debug ? "yellow" : color)
                        linear_extrude(convexity = 10, height = sid[2], center = true)
                            polygon(points = _mb_tube_profile_points(
                                radius_inner = radius_inner,
                                radius_outer = radius_outer,
                                

                                start = start, 
                                end = end,
                            
                                start_rounding_radius = start_rounding_radius,
                                end_rounding_radius = end_rounding_radius,

                                clamp_inner_start_thickness = clamp_inner_start_thickness,
                                clamp_inner_start_height = clamp_inner_start_height,
                                clamp_inner_start_offset = clamp_inner_start_offset,
                                clamp_inner_start_rounding_radius = clamp_inner_start_rounding_radius,
                                
                                clamp_inner_end_thickness = clamp_inner_end_thickness,
                                clamp_inner_end_height = clamp_inner_end_height,
                                clamp_inner_end_offset = clamp_inner_end_offset,
                                clamp_inner_end_rounding_radius = clamp_inner_end_rounding_radius,

                                clamp_outer_start_thickness = clamp_outer_start_thickness,
                                clamp_outer_start_height = clamp_outer_start_height,
                                clamp_outer_start_offset = clamp_outer_start_offset,
                                clamp_outer_start_rounding_radius = clamp_outer_start_rounding_radius,
                                
                                clamp_outer_end_thickness = clamp_outer_end_thickness,
                                clamp_outer_end_height = clamp_outer_end_height,
                                clamp_outer_end_offset = clamp_outer_end_offset,
                                clamp_outer_end_rounding_radius = clamp_outer_end_rounding_radius,

                                rounding_resolution_edge = rounding_resolution_edge
                            ));
                }
            }
    }
}   
/*
* --------------
* START EXAMPLES
* --------------
*/

mb_rail(
    size = [[0, 0, 0], [4, 2, 3]],
    
    rounding_radius = 0, //[4, 12],
    axis = "z",
    offset = undef,
    mul = [8, 8, 3.2],

    clamp_inner_start = [2, 0.5, 0.5, [3, 8]],
    clamp_inner_end = [2, 0.5, 0, [3, 8]],
    
    clamp_outer_start = [1, 1, 0.5, [3, 8]],
    clamp_outer_end = [1, 1, 0.5, 0],
    
    draw_together = true,
    debug = true
);
